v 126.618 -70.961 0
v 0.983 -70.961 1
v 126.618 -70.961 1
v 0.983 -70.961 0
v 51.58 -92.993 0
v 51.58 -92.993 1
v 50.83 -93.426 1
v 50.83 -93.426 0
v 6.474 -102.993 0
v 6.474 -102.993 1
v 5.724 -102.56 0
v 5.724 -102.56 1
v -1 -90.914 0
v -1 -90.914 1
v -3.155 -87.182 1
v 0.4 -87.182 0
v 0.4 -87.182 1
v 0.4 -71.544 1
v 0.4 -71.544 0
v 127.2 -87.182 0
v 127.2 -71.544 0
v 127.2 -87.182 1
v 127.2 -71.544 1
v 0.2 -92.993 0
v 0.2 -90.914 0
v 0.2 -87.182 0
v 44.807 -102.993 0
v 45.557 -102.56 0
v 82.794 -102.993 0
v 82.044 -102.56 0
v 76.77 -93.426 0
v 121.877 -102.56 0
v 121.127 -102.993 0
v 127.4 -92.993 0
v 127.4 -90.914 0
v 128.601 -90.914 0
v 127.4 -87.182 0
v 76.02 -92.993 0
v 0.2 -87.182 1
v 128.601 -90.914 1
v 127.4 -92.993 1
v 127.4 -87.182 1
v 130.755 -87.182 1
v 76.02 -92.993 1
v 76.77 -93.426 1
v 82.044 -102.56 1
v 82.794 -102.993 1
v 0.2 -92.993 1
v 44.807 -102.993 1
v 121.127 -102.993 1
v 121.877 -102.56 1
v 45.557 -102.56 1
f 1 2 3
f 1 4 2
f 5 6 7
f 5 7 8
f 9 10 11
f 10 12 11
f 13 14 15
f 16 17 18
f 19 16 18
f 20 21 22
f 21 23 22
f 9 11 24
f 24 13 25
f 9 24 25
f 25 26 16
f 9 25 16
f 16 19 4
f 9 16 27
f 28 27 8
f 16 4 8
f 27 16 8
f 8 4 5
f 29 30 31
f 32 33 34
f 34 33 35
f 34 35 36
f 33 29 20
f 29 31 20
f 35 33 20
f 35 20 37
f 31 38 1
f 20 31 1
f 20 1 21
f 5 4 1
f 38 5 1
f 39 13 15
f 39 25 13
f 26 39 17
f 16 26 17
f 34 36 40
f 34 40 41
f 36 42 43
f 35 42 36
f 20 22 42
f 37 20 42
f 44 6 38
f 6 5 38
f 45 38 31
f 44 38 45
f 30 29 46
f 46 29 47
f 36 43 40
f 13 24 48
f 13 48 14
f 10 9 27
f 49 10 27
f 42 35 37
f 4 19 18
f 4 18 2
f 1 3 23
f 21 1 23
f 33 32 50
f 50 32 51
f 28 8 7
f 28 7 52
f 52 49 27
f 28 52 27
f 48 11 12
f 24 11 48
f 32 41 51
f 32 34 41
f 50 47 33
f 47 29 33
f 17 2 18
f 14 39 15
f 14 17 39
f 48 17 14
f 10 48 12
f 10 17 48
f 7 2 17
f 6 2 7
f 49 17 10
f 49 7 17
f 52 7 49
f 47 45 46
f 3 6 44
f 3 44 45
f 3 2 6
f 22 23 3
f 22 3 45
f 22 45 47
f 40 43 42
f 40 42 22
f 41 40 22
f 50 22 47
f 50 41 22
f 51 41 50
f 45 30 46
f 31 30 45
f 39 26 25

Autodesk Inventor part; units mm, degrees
ref_plane "YZ Plane" through (0, 0, 0) normal (1, 0, 0) x (0, 1, 0)
ref_plane "XZ Plane" through (0, 0, 0) normal (0, 1, 0) x (-1, 0, 0)
ref_plane "XY Plane" through (0, 0, 0) normal (0, 0, 1) x (1, 0, 0)
ref_plane "РабПлоскость1" through (0, 0, 0) normal (0, 0, 1) x (1, 0, 0)
sketch "Эскиз1" plane through (0, 0, 0) normal (0, 0, 1) x (1, 0, 0)
  line L0 (0, -90.9139) -> (0, -87.1819)
  line L1 (0, -75.9857) -> (0, -72.2537) projected
  line L2 (0, -72.2537) -> (3, -61.0575) projected
  line L3 (3, -61.0575) -> (0, -61.0575) projected
  line L4 (0, -61.0575) -> (0, -57.3255) projected
  line L5 (0, -57.3255) -> (3, -46.1293) projected
  line L6 (3, -46.1293) -> (0, -46.1293) projected
  line L7 (0, -46.1293) -> (0, -42.3973) projected
  line L8 (0, -42.3973) -> (3, -31.2011) projected
  line L9 (3, -31.2011) -> (0, -31.2011) projected
  line L10 (0, -31.2011) -> (0, -27.4691) projected
  line L11 (0, -27.4691) -> (3, -16.2729) projected
  line L12 (3, -16.2729) -> (0, -16.2729) projected
  line L13 (0, -16.2729) -> (0, -12.5409) projected
  line L14 (127.6, -12.5409) -> (0, -12.5409)
  line L15 (127.6, -57.3255) -> (124.6, -46.1293)
  line L16 (127.6, -61.0575) -> (127.6, -57.3255)
  line L17 (124.6, -61.0575) -> (127.6, -61.0575)
  line L18 (127.6, -72.2537) -> (124.6, -61.0575)
  line L19 (127.6, -75.9857) -> (127.6, -72.2537)
  line L20 (124.6, -75.9857) -> (127.6, -75.9857)
  line L21 (127.6, -87.1819) -> (124.6, -75.9857) projected
  line L22 (127.6, -90.9139) -> (127.6, -87.1819) projected
  line L23 (84.6, -94.6473) -> (84.6, -100.1704) projected
  line L24 (83.844, -94.6473) -> (84.6, -94.6473) projected
  line L25 (83.844, -94.6473) -> (84.844, -90.9152) projected
  line L26 (132.6, -90.9152) -> (84.844, -90.9152) projected
  line L27 (132.6, -90.9152) -> (134.6, -98.3793) projected
  line L28 (134.6, -98.3793) -> (134.6, 2.1319)
  line L29 (134.6, 2.1319) -> (-7, 2.1319)
  line L30 (-7, -98.3793) -> (-7, 2.1319) projected
  line L31 (-5, -90.9152) -> (-7, -98.3793) projected
  line L32 (127.6, -75.4591) -> (127.6, -90.9139) projected
  line L33 (0.2004, -110.9139) -> (127.4004, -110.9139)
  line L34 (127.4004, -110.9139) -> (127.4004, -70.9139)
  line L35 (127.4004, -70.9139) -> (0.2004, -70.9139)
  line L36 (0.2004, -70.9139) -> (0.2004, -110.9139)
  line L37 (0.2004, -110.9139) -> (127.4004, -70.9139) construction
  line L38 (127.4004, -110.9139) -> (0.2004, -70.9139) construction
  line L39 (51.0804, -92.9931) -> (38.3604, -115.0247)
  line L40 (38.3604, -115.0247) -> (12.9204, -115.0247)
  line L41 (12.9204, -115.0247) -> (0.2004, -92.9931)
  line L42 (0.2004, -70.9614) -> (63.8004, -70.9614)
  line L43 (38.3604, -70.9614) -> (51.0804, -92.9931)
  line L44 (-1, -89.7832) -> (-1, -91.3815)
  line L45 (0.2004, -92.9931) -> (5.8434, -102.7672)
  line L46 (63.8004, -70.9139) -> (63.8004, -110.9139)
  line L47 (51.0804, -92.9931) -> (63.8004, -92.9931)
  line L48 (0.2004, -92.9931) -> (-1, -90.9139)
  line L49 (5.9739, -102.9931) -> (45.3069, -102.9931)
  line L50 (-1, -90.9139) -> (0, -90.9139)
  line L51 (0, -90.9139) -> (0.2004, -90.9139)
  point P0 (0, 0)
  point P1 (63.8004, -90.9139)
  point P2 (25.6404, -92.9931)
  point P3 (5.9739, -102.9931)
  point P4 (0.3463, -70.9614)
  point P5 (0.2004, -71.5059)
  dimension "d0" = 127.6
  dimension "d1" = 127.2
  dimension "d2" = 40
  dimension "d3" = 50.88
  dimension "d4" = 0
  dimension "d5" = 1
  dimension "d6" = 25.44
  dimension "d7" = 10
extrude "Выдавливание1" add sketch "Эскиз1" along normal blind 1 contours L36 L42 L2 | L2 L42 L43 L39 L49 L41 L36 | L36 L48 L50 L51 | L42 L46 L47 L43
chamfer "Фаска1" distance 0.5 angle 45 4 edges at (0.2004, -70.9614, 0.5) (45.3069, -102.9931, 0.5) (5.9739, -102.9931, 0.5) (51.0804, -92.9931, 0.5)
sketch "Эскиз3" plane through (0.2004, -90.9139, 0) normal (-1, 0, 0) x (0, 0, 1)
  line L0 (-2.0003, -7.4654) -> (24.9316, 93.0458) projected
  line L1 (0, 19.4526) -> (1, 19.4526) projected
  line L2 (0, 19.4526) -> (0, 0) projected
  line L3 (0, 0) -> (1, 0) projected
  line L4 (1, 19.4526) -> (1, 0) projected
  line L5 (0, 0) -> (1, 0) projected
  point P0 (0, 90.9139)
  point P1 (1, 3.7321)
extrude "Выдавливание2" add sketch "Эскиз3" along normal blind 4 contours L0 L4 L3
sketch "Эскиз4" plane through (0, 0, 1) normal (0, 0, 1) x (1, 0, 0)
  line L0 (-1, -90.9139) -> (5.7239, -102.56) projected
  line L1 (0.2004, -90.9139) -> (-1, -90.9139) projected
  line L2 (-1, -90.9139) -> (-3.1547, -87.1819)
  line L3 (0.2004, -87.1819) -> (-3.7996, -87.1819) projected
  line L4 (-1, -90.9139) -> (-3.7996, -90.9139) projected
  line L5 (-3.7996, -90.9139) -> (-3.7996, -87.1819) projected
  point P0 (0, 0)
extrude "Выдавливание3" cut sketch "Эскиз4" against normal blind 4
sketch "Эскиз6" plane through (0, 0, 1) normal (0, 0, 1) x (1, 0, 0)
  line L0 (-3.1547, -87.1819) -> (5.7239, -102.56) projected
  line L1 (6.4739, -102.9931) -> (5.7239, -102.56) projected
  line L2 (6.4739, -102.9931) -> (44.8069, -102.9931) projected
  line L3 (45.5569, -102.56) -> (44.8069, -102.9931) projected
  line L4 (45.5569, -102.56) -> (50.8304, -93.4261) projected
  line L5 (51.5804, -92.9931) -> (50.8304, -93.4261) projected
  line L6 (51.5804, -92.9931) -> (63.8004, -92.9931) projected
  line L7 (63.8004, -92.9931) -> (63.8004, -70.9614) projected
  line L8 (63.8004, -70.9614) -> (0.7004, -70.9614) projected
  line L9 (0.2004, -71.4614) -> (0.7004, -70.9614) projected
  line L10 (0.2004, -71.4614) -> (0.2004, -87.1819) projected
  line L11 (0.2004, -87.1819) -> (-3.1547, -87.1819) projected
  line L12 (0.4004, -87.3819) -> (0.4004, -71.5442)
  line L13 (0.4004, -71.5442) -> (0.7832, -71.1614)
  line L14 (0.7832, -71.1614) -> (63.6004, -71.1614)
  line L15 (63.6004, -71.1614) -> (63.6004, -92.7931)
  line L16 (63.6004, -92.7931) -> (51.5268, -92.7931)
  line L17 (51.5268, -92.7931) -> (50.684, -93.2797)
  line L18 (50.684, -93.2797) -> (45.4105, -102.4136)
  line L19 (45.4105, -102.4136) -> (44.7533, -102.7931)
  line L20 (44.7533, -102.7931) -> (6.5275, -102.7931)
  line L21 (6.5275, -102.7931) -> (5.8703, -102.4136)
  line L22 (5.8703, -102.4136) -> (-2.8083, -87.3819)
  line L23 (-2.8083, -87.3819) -> (0.4004, -87.3819)
  line L24 (0.2004, -87.1819) -> (-3.1547, -87.1819) projected
  line L25 (0.2004, -87.1819) -> (0.4004, -87.1819)
  line L26 (0.7832, -71.1614) -> (0.9832, -70.9614)
  point P0 (0, 0)
  point P1 (0.8418, -70.9614)
  dimension "d20" = 0.2
extrude "Выдавливание5" cut sketch "Эскиз6" against normal blind 10 contours L10 L9 L8 L26 L13 L12 L25
sketch "Эскиз7" plane through (0, 0, 0) normal (0, 0, -1) x (-1, 0, 0)
  line L0 (-0.4004, -87.1819) -> (-0.4004, -71.5442) projected
  line L1 (-0.4004, -71.5442) -> (-0.9832, -70.9614) projected
  line L2 (-0.2004, -90.9139) -> (1, -90.9139) projected
  line L3 (-0.2004, -87.1819) -> (-0.2004, -90.9139) projected
  line L4 (-1.3004, -71.9614) -> (-1.3004, -88.1819)
  line L5 (-1.3004, -88.1819) -> (-1.2004, -88.1819)
  line L6 (-1.2004, -88.1819) -> (-1.2004, -91.9139)
  line L7 (-1.2004, -91.9139) -> (-0.7321, -91.9139)
  line L8 (-0.7321, -91.9139) -> (-6.4559, -101.828)
  line L9 (-6.4559, -101.828) -> (-6.7418, -101.9931)
  line L10 (-6.7418, -101.9931) -> (-44.5389, -101.9931)
  line L11 (-44.5389, -101.9931) -> (-44.8248, -101.828)
  line L12 (-44.8248, -101.828) -> (-50.0983, -92.694)
  line L13 (-50.0983, -92.694) -> (-51.3124, -91.9931)
  line L14 (-51.3124, -91.9931) -> (-62.8004, -91.9931)
  line L15 (-62.8004, -91.9931) -> (-62.8004, -71.9614)
  line L16 (-62.8004, -71.9614) -> (-1.3004, -71.9614)
  line L17 (-1.3004, -71.9614) -> (-62.8004, -81.9772) construction
  line L18 (-1.3807, -71.4679) -> (-62.8807, -81.4837)
  line L19 (-62.72, -82.4707) -> (-1.22, -72.4549)
  arc A0 (-1.22, -72.4549) -> (-1.3807, -71.4679) centre (-1.3004, -71.9614) ccw
  arc A1 (-62.8807, -81.4837) -> (-62.72, -82.4707) centre (-62.8004, -81.9772) ccw
  line L20 (-62.8004, -81.9772) -> (-1.2004, -91.9139) construction
  line L21 (-62.88, -82.4708) -> (-1.28, -92.4076)
  line L22 (-1.1207, -91.4203) -> (-62.7207, -81.4836)
  arc A2 (-62.7207, -81.4836) -> (-62.88, -82.4708) centre (-62.8004, -81.9772) ccw
  arc A3 (-1.28, -92.4076) -> (-1.1207, -91.4203) centre (-1.2004, -91.9139) ccw
  line L23 (-62.8004, -87.9931) -> (-1.2004, -87.9931) construction
  line L24 (-62.8004, -88.4931) -> (-1.2004, -88.4931)
  line L25 (-1.2004, -87.4931) -> (-62.8004, -87.4931)
  arc A4 (-62.8004, -87.4931) -> (-62.8004, -88.4931) centre (-62.8004, -87.9931) ccw
  arc A5 (-1.2004, -88.4931) -> (-1.2004, -87.4931) centre (-1.2004, -87.9931) ccw
  line L26 (-62.8004, -75.9614) -> (-1.3004, -75.9614) construction
  line L27 (-62.8004, -76.4614) -> (-1.3004, -76.4614)
  line L28 (-1.3004, -75.4614) -> (-62.8004, -75.4614)
  arc A6 (-62.8004, -75.4614) -> (-62.8004, -76.4614) centre (-62.8004, -75.9614) ccw
  arc A7 (-1.3004, -76.4614) -> (-1.3004, -75.4614) centre (-1.3004, -75.9614) ccw
  line L29 (-62.8004, -81.9772) -> (-1.3004, -81.9772) construction
  line L30 (-62.8004, -82.4772) -> (-1.3004, -82.4772)
  line L31 (-1.3004, -81.4772) -> (-62.8004, -81.4772)
  arc A8 (-62.8004, -81.4772) -> (-62.8004, -82.4772) centre (-62.8004, -81.9772) ccw
  arc A9 (-1.3004, -82.4772) -> (-1.3004, -81.4772) centre (-1.3004, -81.9772) ccw
  line L32 (-0.2004, -87.1819) -> (-0.4004, -87.1819) projected
  line L33 (-63.8004, -70.9614) -> (-0.9832, -70.9614) projected
  line L34 (-63.8004, -92.9931) -> (-63.8004, -70.9614) projected
  line L35 (-51.5804, -92.9931) -> (-63.8004, -92.9931) projected
  line L36 (-50.8304, -93.4261) -> (-51.5804, -92.9931) projected
  line L37 (-45.5569, -102.56) -> (-50.8304, -93.4261) projected
  line L38 (-44.8069, -102.9931) -> (-45.5569, -102.56) projected
  line L39 (-6.4739, -102.9931) -> (-44.8069, -102.9931) projected
  line L40 (-5.7239, -102.56) -> (-6.4739, -102.9931) projected
  line L41 (1, -90.9139) -> (-5.7239, -102.56) projected
  point P0 (0, 0)
  point P1 (-32.0504, -76.9693)
  point P2 (-32.0004, -86.9456)
  point P3 (-62.8004, -81.4706)
  point P4 (-4.411, -71.9614)
  point P5 (-0.9953, -92.37)
  point P6 (-62.8004, -82.4837)
  point P7 (-1.3004, -72.468)
  point P8 (-59.6753, -81.9749)
  point P9 (-1.2004, -91.4075)
  point P10 (-32.0004, -87.9931)
  point P11 (-32.0504, -75.9614)
  point P12 (-32.0504, -81.9772)
  point P13 (-25.9019, -75.4614)
  point P14 (-19.6807, -75.4614)
  point P15 (-1.2004, -88.4931)
  point P16 (-19.2676, -88.4931)
  point P17 (-32.0422, -76.4614)
  point P18 (-56.6197, -81.4772)
  point P19 (-1.3004, -76.4614)
  point P20 (-25.821, -76.4614)
  point P21 (-1.3004, -82.4772)
  point P22 (-56.5611, -82.4772)
  point P23 (-25.4668, -87.4931)
  point P24 (-1.3004, -87.4931)
  point P25 (-31.7461, -87.4931)
  point P26 (-25.5469, -88.4931)
  dimension "d24" = 1
  dimension "d25" = 1
  dimension "d28" = 1
  dimension "d30" = 1
  dimension "d32" = 1
extrude "Выдавливание6" [suppressed]
mirror "Зеркальное отражение2" about plane through (63.8004, -92.9931, 0) normal (1, 0, 0)
properties part number "Пластина"
